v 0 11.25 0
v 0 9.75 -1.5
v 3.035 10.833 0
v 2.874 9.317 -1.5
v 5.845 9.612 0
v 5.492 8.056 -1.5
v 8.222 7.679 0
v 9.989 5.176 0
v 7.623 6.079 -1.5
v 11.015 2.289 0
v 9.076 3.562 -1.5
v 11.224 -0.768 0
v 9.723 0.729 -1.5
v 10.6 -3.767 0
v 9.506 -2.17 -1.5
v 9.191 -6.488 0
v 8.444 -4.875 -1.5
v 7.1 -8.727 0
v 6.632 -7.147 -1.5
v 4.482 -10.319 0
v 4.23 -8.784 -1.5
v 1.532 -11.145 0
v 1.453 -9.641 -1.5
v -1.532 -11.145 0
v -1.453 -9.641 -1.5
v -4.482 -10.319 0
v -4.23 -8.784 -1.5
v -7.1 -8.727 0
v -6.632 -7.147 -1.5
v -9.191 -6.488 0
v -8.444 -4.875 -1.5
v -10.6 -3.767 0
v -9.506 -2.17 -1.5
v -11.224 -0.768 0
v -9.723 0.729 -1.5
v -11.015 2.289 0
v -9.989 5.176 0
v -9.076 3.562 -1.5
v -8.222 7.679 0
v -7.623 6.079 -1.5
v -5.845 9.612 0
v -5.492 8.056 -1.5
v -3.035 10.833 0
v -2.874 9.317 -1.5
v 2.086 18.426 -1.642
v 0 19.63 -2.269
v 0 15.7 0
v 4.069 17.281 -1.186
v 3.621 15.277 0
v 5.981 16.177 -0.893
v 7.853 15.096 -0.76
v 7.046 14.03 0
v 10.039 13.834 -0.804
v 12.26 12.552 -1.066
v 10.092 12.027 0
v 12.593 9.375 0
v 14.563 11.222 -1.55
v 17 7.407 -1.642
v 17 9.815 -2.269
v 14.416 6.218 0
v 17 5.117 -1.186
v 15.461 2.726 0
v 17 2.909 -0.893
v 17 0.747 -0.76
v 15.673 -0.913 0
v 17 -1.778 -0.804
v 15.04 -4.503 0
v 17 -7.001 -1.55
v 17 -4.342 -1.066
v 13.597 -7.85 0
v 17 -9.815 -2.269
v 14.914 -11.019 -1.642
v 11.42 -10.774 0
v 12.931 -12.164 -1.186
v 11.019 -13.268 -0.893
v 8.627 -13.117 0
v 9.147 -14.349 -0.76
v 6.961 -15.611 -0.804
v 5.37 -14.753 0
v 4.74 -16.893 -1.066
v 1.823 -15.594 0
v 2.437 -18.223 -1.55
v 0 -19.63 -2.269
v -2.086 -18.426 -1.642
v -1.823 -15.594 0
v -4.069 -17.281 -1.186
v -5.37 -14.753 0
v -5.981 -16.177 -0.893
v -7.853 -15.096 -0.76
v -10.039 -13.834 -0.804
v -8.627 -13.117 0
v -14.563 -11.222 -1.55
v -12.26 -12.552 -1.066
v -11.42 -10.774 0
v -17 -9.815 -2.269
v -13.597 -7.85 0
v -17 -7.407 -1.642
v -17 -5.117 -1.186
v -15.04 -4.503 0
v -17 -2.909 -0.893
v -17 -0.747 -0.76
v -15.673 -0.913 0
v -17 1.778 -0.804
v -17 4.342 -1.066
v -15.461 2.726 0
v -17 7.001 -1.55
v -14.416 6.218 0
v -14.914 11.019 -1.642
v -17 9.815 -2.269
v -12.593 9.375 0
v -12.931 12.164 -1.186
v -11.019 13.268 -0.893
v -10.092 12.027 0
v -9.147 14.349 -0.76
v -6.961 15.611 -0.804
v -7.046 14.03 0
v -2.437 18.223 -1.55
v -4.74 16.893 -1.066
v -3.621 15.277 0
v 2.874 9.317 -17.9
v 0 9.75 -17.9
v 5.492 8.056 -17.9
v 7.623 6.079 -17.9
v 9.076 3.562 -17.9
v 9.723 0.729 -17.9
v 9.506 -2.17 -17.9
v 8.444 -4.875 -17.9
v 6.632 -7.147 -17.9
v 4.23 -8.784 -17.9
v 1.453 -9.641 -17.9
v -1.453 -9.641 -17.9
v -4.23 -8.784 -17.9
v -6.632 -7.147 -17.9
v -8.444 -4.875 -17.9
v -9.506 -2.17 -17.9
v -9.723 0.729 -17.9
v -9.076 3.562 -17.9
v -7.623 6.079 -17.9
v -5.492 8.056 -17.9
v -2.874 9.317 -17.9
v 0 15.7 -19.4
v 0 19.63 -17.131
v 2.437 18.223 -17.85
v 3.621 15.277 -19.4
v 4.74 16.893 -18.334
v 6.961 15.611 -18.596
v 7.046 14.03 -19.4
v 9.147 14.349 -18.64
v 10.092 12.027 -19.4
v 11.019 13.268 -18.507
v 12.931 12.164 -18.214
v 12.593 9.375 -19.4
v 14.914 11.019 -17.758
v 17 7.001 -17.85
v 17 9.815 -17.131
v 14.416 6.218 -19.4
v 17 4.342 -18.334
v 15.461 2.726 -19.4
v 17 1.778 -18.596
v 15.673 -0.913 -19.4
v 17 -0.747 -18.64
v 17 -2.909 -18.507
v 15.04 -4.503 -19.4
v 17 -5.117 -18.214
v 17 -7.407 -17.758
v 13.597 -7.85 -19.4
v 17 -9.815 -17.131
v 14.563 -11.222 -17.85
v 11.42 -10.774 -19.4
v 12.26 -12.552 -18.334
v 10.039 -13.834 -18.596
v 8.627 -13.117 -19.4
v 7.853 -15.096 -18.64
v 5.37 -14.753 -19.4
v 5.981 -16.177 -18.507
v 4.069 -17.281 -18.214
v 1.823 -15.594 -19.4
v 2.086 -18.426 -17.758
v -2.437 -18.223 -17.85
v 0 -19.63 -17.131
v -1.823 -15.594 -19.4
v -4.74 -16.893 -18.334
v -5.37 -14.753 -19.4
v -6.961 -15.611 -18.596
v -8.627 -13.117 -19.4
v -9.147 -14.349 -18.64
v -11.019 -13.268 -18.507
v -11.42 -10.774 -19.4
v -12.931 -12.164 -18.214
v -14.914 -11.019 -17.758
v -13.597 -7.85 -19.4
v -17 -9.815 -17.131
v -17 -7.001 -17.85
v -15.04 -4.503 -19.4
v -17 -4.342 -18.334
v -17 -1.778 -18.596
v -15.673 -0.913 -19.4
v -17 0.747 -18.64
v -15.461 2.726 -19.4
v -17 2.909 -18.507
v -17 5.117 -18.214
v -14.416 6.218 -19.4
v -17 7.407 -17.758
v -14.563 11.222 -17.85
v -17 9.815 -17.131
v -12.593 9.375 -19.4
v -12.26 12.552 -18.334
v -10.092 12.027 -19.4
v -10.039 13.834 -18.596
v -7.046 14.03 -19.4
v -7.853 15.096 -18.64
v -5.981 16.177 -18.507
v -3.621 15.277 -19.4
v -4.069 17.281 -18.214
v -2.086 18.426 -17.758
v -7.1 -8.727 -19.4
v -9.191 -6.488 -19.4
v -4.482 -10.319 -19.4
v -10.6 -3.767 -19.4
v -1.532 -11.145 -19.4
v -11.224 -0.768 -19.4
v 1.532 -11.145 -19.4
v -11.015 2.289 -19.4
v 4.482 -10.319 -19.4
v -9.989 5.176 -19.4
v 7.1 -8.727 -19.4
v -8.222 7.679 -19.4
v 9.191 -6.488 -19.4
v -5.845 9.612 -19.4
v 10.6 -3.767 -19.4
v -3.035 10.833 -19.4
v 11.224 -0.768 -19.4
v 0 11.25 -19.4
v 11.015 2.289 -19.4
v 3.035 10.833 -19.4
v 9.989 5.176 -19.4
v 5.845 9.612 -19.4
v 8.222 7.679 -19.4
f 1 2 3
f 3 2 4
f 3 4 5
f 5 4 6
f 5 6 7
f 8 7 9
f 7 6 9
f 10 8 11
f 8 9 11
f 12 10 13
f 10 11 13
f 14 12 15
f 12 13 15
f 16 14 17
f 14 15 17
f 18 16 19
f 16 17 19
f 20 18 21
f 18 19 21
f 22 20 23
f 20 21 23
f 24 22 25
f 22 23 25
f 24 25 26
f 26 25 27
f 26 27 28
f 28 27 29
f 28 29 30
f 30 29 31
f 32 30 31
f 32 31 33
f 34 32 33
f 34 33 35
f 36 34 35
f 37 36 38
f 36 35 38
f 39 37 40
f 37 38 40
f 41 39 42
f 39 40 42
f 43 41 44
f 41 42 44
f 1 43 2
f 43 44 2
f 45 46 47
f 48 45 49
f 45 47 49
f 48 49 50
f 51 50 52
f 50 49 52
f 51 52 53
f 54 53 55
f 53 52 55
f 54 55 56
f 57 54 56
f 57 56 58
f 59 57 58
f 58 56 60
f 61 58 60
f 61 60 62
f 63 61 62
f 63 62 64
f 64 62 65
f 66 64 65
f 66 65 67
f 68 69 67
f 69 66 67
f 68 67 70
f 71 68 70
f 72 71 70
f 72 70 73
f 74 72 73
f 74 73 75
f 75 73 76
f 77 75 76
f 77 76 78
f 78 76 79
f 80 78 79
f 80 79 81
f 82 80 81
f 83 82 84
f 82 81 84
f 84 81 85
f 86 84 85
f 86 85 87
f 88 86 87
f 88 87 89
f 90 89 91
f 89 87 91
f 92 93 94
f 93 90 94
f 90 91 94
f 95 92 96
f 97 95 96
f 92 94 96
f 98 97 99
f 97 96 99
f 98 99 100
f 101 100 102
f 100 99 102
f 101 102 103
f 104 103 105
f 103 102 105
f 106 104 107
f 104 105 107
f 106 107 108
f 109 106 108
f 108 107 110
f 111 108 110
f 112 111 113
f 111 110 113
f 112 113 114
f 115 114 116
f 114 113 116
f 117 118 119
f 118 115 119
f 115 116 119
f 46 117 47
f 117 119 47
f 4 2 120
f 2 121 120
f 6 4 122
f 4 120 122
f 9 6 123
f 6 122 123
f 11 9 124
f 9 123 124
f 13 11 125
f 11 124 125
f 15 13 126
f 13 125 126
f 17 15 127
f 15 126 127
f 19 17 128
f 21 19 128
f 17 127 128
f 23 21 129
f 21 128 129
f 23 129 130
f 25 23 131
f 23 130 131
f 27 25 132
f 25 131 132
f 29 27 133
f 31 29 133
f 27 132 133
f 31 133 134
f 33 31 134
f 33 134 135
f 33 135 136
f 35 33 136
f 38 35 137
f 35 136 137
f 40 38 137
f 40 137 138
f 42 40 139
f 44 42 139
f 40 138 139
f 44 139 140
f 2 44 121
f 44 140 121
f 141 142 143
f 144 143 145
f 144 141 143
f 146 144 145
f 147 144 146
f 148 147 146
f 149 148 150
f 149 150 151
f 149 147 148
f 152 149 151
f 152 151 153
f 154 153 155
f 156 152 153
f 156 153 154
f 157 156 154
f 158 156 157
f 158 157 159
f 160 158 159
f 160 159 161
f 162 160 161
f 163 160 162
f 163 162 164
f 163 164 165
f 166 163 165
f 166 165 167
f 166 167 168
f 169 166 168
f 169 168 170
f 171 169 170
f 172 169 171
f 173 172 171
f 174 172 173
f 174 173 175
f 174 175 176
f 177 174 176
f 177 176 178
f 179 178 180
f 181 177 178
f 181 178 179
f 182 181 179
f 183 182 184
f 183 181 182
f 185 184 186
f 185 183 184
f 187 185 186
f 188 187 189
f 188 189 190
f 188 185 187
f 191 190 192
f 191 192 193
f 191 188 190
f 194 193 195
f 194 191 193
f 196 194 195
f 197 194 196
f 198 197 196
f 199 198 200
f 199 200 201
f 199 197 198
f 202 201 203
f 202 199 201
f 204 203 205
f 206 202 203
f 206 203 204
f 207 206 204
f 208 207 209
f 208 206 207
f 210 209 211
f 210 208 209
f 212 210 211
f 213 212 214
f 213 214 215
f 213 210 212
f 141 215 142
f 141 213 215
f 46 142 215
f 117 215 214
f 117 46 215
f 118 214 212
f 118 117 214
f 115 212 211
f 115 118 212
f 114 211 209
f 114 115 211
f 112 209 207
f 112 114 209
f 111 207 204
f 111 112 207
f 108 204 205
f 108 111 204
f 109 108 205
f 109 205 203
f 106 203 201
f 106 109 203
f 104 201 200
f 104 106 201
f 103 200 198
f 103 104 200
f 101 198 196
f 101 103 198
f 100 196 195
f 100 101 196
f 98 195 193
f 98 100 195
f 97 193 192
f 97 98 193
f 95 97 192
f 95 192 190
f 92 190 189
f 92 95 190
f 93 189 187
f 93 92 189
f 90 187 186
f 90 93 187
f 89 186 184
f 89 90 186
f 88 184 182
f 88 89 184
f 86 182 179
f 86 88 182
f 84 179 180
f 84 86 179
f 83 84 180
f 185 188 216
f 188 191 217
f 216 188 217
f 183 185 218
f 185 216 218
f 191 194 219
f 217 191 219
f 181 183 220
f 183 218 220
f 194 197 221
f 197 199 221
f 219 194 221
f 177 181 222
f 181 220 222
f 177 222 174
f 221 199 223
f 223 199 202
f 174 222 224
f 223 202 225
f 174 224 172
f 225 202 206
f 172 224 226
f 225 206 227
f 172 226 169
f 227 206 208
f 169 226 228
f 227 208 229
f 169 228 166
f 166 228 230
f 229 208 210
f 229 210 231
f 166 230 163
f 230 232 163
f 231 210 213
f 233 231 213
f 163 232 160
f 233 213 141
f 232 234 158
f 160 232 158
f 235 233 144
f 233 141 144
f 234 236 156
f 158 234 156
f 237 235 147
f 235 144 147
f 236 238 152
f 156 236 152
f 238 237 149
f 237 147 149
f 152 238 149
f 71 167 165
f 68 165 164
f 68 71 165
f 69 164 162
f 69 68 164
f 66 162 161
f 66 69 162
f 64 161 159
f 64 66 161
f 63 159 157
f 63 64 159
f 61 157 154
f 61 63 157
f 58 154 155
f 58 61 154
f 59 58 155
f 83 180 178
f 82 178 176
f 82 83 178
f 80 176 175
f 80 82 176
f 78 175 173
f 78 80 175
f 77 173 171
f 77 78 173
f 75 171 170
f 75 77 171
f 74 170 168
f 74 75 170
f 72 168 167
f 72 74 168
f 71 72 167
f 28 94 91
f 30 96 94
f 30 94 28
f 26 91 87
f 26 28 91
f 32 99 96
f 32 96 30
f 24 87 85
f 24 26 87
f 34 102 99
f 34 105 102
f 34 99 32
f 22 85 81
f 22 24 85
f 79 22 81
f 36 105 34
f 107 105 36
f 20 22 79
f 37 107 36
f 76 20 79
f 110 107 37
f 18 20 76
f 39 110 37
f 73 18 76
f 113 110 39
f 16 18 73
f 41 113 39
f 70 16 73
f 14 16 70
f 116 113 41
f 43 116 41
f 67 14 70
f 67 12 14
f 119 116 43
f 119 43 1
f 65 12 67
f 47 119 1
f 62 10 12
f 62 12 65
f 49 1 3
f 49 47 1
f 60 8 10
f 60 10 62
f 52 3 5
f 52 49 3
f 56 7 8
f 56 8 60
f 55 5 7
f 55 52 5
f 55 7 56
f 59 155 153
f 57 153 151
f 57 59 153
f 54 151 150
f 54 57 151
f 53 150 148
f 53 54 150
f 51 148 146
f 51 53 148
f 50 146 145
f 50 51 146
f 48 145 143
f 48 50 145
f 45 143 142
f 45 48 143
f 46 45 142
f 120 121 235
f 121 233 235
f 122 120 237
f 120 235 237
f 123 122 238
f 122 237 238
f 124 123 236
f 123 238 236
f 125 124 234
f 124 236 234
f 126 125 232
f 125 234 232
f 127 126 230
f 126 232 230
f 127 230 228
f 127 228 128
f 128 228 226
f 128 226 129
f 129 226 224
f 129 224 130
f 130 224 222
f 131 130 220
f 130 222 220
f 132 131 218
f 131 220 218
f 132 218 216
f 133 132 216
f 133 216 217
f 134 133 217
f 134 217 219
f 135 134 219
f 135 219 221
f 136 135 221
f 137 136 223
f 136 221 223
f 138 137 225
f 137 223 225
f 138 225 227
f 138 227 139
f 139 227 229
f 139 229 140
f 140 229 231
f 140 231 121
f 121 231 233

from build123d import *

# Parameters (mm, degrees)
BOSS_EXTRUDE1_DEPTH = 19.4


with BuildPart() as part:
    # Sketch1 → Boss-Extrude1 (new body)
    with BuildSketch(Plane.XY):
        Polygon((0, 19.629909152), (-17, 9.814954576), (-17, -9.814954576), (0, -19.629909152), (17, -9.814954576), (17, 9.814954576), align=None)
    extrude(amount=-BOSS_EXTRUDE1_DEPTH)

    # Sketch4 → Cut-Revolve1 (revolve, cut)
    with BuildSketch(Plane(origin=(0, 0, 0), x_dir=(0, 0, -1), z_dir=(1, 0, 0))):
        Polygon((19.4, 19.629909152), (17.131065893, 19.629909152), (19.4, 15.7), align=None)
        Polygon((0, 19.629909152), (2.268934107, 19.629909152), (0, 15.7), align=None)
    revolve(axis=Axis((0, 0, 0), (0, 0, -1)), mode=Mode.SUBTRACT)

    # Sketch5 → Cut-Revolve2 (revolve, cut)
    with BuildSketch(Plane(origin=(0, 0, 0), x_dir=(0, 0, -1), z_dir=(1, 0, 0))):
        Polygon((0, 0), (0, 11.25), (1.5, 9.75), (17.9, 9.75), (19.4, 11.25), (19.4, 0), align=None)
    revolve(axis=Axis((0, 0, 0), (0, 0, -1)), mode=Mode.SUBTRACT)


solid = part.part
